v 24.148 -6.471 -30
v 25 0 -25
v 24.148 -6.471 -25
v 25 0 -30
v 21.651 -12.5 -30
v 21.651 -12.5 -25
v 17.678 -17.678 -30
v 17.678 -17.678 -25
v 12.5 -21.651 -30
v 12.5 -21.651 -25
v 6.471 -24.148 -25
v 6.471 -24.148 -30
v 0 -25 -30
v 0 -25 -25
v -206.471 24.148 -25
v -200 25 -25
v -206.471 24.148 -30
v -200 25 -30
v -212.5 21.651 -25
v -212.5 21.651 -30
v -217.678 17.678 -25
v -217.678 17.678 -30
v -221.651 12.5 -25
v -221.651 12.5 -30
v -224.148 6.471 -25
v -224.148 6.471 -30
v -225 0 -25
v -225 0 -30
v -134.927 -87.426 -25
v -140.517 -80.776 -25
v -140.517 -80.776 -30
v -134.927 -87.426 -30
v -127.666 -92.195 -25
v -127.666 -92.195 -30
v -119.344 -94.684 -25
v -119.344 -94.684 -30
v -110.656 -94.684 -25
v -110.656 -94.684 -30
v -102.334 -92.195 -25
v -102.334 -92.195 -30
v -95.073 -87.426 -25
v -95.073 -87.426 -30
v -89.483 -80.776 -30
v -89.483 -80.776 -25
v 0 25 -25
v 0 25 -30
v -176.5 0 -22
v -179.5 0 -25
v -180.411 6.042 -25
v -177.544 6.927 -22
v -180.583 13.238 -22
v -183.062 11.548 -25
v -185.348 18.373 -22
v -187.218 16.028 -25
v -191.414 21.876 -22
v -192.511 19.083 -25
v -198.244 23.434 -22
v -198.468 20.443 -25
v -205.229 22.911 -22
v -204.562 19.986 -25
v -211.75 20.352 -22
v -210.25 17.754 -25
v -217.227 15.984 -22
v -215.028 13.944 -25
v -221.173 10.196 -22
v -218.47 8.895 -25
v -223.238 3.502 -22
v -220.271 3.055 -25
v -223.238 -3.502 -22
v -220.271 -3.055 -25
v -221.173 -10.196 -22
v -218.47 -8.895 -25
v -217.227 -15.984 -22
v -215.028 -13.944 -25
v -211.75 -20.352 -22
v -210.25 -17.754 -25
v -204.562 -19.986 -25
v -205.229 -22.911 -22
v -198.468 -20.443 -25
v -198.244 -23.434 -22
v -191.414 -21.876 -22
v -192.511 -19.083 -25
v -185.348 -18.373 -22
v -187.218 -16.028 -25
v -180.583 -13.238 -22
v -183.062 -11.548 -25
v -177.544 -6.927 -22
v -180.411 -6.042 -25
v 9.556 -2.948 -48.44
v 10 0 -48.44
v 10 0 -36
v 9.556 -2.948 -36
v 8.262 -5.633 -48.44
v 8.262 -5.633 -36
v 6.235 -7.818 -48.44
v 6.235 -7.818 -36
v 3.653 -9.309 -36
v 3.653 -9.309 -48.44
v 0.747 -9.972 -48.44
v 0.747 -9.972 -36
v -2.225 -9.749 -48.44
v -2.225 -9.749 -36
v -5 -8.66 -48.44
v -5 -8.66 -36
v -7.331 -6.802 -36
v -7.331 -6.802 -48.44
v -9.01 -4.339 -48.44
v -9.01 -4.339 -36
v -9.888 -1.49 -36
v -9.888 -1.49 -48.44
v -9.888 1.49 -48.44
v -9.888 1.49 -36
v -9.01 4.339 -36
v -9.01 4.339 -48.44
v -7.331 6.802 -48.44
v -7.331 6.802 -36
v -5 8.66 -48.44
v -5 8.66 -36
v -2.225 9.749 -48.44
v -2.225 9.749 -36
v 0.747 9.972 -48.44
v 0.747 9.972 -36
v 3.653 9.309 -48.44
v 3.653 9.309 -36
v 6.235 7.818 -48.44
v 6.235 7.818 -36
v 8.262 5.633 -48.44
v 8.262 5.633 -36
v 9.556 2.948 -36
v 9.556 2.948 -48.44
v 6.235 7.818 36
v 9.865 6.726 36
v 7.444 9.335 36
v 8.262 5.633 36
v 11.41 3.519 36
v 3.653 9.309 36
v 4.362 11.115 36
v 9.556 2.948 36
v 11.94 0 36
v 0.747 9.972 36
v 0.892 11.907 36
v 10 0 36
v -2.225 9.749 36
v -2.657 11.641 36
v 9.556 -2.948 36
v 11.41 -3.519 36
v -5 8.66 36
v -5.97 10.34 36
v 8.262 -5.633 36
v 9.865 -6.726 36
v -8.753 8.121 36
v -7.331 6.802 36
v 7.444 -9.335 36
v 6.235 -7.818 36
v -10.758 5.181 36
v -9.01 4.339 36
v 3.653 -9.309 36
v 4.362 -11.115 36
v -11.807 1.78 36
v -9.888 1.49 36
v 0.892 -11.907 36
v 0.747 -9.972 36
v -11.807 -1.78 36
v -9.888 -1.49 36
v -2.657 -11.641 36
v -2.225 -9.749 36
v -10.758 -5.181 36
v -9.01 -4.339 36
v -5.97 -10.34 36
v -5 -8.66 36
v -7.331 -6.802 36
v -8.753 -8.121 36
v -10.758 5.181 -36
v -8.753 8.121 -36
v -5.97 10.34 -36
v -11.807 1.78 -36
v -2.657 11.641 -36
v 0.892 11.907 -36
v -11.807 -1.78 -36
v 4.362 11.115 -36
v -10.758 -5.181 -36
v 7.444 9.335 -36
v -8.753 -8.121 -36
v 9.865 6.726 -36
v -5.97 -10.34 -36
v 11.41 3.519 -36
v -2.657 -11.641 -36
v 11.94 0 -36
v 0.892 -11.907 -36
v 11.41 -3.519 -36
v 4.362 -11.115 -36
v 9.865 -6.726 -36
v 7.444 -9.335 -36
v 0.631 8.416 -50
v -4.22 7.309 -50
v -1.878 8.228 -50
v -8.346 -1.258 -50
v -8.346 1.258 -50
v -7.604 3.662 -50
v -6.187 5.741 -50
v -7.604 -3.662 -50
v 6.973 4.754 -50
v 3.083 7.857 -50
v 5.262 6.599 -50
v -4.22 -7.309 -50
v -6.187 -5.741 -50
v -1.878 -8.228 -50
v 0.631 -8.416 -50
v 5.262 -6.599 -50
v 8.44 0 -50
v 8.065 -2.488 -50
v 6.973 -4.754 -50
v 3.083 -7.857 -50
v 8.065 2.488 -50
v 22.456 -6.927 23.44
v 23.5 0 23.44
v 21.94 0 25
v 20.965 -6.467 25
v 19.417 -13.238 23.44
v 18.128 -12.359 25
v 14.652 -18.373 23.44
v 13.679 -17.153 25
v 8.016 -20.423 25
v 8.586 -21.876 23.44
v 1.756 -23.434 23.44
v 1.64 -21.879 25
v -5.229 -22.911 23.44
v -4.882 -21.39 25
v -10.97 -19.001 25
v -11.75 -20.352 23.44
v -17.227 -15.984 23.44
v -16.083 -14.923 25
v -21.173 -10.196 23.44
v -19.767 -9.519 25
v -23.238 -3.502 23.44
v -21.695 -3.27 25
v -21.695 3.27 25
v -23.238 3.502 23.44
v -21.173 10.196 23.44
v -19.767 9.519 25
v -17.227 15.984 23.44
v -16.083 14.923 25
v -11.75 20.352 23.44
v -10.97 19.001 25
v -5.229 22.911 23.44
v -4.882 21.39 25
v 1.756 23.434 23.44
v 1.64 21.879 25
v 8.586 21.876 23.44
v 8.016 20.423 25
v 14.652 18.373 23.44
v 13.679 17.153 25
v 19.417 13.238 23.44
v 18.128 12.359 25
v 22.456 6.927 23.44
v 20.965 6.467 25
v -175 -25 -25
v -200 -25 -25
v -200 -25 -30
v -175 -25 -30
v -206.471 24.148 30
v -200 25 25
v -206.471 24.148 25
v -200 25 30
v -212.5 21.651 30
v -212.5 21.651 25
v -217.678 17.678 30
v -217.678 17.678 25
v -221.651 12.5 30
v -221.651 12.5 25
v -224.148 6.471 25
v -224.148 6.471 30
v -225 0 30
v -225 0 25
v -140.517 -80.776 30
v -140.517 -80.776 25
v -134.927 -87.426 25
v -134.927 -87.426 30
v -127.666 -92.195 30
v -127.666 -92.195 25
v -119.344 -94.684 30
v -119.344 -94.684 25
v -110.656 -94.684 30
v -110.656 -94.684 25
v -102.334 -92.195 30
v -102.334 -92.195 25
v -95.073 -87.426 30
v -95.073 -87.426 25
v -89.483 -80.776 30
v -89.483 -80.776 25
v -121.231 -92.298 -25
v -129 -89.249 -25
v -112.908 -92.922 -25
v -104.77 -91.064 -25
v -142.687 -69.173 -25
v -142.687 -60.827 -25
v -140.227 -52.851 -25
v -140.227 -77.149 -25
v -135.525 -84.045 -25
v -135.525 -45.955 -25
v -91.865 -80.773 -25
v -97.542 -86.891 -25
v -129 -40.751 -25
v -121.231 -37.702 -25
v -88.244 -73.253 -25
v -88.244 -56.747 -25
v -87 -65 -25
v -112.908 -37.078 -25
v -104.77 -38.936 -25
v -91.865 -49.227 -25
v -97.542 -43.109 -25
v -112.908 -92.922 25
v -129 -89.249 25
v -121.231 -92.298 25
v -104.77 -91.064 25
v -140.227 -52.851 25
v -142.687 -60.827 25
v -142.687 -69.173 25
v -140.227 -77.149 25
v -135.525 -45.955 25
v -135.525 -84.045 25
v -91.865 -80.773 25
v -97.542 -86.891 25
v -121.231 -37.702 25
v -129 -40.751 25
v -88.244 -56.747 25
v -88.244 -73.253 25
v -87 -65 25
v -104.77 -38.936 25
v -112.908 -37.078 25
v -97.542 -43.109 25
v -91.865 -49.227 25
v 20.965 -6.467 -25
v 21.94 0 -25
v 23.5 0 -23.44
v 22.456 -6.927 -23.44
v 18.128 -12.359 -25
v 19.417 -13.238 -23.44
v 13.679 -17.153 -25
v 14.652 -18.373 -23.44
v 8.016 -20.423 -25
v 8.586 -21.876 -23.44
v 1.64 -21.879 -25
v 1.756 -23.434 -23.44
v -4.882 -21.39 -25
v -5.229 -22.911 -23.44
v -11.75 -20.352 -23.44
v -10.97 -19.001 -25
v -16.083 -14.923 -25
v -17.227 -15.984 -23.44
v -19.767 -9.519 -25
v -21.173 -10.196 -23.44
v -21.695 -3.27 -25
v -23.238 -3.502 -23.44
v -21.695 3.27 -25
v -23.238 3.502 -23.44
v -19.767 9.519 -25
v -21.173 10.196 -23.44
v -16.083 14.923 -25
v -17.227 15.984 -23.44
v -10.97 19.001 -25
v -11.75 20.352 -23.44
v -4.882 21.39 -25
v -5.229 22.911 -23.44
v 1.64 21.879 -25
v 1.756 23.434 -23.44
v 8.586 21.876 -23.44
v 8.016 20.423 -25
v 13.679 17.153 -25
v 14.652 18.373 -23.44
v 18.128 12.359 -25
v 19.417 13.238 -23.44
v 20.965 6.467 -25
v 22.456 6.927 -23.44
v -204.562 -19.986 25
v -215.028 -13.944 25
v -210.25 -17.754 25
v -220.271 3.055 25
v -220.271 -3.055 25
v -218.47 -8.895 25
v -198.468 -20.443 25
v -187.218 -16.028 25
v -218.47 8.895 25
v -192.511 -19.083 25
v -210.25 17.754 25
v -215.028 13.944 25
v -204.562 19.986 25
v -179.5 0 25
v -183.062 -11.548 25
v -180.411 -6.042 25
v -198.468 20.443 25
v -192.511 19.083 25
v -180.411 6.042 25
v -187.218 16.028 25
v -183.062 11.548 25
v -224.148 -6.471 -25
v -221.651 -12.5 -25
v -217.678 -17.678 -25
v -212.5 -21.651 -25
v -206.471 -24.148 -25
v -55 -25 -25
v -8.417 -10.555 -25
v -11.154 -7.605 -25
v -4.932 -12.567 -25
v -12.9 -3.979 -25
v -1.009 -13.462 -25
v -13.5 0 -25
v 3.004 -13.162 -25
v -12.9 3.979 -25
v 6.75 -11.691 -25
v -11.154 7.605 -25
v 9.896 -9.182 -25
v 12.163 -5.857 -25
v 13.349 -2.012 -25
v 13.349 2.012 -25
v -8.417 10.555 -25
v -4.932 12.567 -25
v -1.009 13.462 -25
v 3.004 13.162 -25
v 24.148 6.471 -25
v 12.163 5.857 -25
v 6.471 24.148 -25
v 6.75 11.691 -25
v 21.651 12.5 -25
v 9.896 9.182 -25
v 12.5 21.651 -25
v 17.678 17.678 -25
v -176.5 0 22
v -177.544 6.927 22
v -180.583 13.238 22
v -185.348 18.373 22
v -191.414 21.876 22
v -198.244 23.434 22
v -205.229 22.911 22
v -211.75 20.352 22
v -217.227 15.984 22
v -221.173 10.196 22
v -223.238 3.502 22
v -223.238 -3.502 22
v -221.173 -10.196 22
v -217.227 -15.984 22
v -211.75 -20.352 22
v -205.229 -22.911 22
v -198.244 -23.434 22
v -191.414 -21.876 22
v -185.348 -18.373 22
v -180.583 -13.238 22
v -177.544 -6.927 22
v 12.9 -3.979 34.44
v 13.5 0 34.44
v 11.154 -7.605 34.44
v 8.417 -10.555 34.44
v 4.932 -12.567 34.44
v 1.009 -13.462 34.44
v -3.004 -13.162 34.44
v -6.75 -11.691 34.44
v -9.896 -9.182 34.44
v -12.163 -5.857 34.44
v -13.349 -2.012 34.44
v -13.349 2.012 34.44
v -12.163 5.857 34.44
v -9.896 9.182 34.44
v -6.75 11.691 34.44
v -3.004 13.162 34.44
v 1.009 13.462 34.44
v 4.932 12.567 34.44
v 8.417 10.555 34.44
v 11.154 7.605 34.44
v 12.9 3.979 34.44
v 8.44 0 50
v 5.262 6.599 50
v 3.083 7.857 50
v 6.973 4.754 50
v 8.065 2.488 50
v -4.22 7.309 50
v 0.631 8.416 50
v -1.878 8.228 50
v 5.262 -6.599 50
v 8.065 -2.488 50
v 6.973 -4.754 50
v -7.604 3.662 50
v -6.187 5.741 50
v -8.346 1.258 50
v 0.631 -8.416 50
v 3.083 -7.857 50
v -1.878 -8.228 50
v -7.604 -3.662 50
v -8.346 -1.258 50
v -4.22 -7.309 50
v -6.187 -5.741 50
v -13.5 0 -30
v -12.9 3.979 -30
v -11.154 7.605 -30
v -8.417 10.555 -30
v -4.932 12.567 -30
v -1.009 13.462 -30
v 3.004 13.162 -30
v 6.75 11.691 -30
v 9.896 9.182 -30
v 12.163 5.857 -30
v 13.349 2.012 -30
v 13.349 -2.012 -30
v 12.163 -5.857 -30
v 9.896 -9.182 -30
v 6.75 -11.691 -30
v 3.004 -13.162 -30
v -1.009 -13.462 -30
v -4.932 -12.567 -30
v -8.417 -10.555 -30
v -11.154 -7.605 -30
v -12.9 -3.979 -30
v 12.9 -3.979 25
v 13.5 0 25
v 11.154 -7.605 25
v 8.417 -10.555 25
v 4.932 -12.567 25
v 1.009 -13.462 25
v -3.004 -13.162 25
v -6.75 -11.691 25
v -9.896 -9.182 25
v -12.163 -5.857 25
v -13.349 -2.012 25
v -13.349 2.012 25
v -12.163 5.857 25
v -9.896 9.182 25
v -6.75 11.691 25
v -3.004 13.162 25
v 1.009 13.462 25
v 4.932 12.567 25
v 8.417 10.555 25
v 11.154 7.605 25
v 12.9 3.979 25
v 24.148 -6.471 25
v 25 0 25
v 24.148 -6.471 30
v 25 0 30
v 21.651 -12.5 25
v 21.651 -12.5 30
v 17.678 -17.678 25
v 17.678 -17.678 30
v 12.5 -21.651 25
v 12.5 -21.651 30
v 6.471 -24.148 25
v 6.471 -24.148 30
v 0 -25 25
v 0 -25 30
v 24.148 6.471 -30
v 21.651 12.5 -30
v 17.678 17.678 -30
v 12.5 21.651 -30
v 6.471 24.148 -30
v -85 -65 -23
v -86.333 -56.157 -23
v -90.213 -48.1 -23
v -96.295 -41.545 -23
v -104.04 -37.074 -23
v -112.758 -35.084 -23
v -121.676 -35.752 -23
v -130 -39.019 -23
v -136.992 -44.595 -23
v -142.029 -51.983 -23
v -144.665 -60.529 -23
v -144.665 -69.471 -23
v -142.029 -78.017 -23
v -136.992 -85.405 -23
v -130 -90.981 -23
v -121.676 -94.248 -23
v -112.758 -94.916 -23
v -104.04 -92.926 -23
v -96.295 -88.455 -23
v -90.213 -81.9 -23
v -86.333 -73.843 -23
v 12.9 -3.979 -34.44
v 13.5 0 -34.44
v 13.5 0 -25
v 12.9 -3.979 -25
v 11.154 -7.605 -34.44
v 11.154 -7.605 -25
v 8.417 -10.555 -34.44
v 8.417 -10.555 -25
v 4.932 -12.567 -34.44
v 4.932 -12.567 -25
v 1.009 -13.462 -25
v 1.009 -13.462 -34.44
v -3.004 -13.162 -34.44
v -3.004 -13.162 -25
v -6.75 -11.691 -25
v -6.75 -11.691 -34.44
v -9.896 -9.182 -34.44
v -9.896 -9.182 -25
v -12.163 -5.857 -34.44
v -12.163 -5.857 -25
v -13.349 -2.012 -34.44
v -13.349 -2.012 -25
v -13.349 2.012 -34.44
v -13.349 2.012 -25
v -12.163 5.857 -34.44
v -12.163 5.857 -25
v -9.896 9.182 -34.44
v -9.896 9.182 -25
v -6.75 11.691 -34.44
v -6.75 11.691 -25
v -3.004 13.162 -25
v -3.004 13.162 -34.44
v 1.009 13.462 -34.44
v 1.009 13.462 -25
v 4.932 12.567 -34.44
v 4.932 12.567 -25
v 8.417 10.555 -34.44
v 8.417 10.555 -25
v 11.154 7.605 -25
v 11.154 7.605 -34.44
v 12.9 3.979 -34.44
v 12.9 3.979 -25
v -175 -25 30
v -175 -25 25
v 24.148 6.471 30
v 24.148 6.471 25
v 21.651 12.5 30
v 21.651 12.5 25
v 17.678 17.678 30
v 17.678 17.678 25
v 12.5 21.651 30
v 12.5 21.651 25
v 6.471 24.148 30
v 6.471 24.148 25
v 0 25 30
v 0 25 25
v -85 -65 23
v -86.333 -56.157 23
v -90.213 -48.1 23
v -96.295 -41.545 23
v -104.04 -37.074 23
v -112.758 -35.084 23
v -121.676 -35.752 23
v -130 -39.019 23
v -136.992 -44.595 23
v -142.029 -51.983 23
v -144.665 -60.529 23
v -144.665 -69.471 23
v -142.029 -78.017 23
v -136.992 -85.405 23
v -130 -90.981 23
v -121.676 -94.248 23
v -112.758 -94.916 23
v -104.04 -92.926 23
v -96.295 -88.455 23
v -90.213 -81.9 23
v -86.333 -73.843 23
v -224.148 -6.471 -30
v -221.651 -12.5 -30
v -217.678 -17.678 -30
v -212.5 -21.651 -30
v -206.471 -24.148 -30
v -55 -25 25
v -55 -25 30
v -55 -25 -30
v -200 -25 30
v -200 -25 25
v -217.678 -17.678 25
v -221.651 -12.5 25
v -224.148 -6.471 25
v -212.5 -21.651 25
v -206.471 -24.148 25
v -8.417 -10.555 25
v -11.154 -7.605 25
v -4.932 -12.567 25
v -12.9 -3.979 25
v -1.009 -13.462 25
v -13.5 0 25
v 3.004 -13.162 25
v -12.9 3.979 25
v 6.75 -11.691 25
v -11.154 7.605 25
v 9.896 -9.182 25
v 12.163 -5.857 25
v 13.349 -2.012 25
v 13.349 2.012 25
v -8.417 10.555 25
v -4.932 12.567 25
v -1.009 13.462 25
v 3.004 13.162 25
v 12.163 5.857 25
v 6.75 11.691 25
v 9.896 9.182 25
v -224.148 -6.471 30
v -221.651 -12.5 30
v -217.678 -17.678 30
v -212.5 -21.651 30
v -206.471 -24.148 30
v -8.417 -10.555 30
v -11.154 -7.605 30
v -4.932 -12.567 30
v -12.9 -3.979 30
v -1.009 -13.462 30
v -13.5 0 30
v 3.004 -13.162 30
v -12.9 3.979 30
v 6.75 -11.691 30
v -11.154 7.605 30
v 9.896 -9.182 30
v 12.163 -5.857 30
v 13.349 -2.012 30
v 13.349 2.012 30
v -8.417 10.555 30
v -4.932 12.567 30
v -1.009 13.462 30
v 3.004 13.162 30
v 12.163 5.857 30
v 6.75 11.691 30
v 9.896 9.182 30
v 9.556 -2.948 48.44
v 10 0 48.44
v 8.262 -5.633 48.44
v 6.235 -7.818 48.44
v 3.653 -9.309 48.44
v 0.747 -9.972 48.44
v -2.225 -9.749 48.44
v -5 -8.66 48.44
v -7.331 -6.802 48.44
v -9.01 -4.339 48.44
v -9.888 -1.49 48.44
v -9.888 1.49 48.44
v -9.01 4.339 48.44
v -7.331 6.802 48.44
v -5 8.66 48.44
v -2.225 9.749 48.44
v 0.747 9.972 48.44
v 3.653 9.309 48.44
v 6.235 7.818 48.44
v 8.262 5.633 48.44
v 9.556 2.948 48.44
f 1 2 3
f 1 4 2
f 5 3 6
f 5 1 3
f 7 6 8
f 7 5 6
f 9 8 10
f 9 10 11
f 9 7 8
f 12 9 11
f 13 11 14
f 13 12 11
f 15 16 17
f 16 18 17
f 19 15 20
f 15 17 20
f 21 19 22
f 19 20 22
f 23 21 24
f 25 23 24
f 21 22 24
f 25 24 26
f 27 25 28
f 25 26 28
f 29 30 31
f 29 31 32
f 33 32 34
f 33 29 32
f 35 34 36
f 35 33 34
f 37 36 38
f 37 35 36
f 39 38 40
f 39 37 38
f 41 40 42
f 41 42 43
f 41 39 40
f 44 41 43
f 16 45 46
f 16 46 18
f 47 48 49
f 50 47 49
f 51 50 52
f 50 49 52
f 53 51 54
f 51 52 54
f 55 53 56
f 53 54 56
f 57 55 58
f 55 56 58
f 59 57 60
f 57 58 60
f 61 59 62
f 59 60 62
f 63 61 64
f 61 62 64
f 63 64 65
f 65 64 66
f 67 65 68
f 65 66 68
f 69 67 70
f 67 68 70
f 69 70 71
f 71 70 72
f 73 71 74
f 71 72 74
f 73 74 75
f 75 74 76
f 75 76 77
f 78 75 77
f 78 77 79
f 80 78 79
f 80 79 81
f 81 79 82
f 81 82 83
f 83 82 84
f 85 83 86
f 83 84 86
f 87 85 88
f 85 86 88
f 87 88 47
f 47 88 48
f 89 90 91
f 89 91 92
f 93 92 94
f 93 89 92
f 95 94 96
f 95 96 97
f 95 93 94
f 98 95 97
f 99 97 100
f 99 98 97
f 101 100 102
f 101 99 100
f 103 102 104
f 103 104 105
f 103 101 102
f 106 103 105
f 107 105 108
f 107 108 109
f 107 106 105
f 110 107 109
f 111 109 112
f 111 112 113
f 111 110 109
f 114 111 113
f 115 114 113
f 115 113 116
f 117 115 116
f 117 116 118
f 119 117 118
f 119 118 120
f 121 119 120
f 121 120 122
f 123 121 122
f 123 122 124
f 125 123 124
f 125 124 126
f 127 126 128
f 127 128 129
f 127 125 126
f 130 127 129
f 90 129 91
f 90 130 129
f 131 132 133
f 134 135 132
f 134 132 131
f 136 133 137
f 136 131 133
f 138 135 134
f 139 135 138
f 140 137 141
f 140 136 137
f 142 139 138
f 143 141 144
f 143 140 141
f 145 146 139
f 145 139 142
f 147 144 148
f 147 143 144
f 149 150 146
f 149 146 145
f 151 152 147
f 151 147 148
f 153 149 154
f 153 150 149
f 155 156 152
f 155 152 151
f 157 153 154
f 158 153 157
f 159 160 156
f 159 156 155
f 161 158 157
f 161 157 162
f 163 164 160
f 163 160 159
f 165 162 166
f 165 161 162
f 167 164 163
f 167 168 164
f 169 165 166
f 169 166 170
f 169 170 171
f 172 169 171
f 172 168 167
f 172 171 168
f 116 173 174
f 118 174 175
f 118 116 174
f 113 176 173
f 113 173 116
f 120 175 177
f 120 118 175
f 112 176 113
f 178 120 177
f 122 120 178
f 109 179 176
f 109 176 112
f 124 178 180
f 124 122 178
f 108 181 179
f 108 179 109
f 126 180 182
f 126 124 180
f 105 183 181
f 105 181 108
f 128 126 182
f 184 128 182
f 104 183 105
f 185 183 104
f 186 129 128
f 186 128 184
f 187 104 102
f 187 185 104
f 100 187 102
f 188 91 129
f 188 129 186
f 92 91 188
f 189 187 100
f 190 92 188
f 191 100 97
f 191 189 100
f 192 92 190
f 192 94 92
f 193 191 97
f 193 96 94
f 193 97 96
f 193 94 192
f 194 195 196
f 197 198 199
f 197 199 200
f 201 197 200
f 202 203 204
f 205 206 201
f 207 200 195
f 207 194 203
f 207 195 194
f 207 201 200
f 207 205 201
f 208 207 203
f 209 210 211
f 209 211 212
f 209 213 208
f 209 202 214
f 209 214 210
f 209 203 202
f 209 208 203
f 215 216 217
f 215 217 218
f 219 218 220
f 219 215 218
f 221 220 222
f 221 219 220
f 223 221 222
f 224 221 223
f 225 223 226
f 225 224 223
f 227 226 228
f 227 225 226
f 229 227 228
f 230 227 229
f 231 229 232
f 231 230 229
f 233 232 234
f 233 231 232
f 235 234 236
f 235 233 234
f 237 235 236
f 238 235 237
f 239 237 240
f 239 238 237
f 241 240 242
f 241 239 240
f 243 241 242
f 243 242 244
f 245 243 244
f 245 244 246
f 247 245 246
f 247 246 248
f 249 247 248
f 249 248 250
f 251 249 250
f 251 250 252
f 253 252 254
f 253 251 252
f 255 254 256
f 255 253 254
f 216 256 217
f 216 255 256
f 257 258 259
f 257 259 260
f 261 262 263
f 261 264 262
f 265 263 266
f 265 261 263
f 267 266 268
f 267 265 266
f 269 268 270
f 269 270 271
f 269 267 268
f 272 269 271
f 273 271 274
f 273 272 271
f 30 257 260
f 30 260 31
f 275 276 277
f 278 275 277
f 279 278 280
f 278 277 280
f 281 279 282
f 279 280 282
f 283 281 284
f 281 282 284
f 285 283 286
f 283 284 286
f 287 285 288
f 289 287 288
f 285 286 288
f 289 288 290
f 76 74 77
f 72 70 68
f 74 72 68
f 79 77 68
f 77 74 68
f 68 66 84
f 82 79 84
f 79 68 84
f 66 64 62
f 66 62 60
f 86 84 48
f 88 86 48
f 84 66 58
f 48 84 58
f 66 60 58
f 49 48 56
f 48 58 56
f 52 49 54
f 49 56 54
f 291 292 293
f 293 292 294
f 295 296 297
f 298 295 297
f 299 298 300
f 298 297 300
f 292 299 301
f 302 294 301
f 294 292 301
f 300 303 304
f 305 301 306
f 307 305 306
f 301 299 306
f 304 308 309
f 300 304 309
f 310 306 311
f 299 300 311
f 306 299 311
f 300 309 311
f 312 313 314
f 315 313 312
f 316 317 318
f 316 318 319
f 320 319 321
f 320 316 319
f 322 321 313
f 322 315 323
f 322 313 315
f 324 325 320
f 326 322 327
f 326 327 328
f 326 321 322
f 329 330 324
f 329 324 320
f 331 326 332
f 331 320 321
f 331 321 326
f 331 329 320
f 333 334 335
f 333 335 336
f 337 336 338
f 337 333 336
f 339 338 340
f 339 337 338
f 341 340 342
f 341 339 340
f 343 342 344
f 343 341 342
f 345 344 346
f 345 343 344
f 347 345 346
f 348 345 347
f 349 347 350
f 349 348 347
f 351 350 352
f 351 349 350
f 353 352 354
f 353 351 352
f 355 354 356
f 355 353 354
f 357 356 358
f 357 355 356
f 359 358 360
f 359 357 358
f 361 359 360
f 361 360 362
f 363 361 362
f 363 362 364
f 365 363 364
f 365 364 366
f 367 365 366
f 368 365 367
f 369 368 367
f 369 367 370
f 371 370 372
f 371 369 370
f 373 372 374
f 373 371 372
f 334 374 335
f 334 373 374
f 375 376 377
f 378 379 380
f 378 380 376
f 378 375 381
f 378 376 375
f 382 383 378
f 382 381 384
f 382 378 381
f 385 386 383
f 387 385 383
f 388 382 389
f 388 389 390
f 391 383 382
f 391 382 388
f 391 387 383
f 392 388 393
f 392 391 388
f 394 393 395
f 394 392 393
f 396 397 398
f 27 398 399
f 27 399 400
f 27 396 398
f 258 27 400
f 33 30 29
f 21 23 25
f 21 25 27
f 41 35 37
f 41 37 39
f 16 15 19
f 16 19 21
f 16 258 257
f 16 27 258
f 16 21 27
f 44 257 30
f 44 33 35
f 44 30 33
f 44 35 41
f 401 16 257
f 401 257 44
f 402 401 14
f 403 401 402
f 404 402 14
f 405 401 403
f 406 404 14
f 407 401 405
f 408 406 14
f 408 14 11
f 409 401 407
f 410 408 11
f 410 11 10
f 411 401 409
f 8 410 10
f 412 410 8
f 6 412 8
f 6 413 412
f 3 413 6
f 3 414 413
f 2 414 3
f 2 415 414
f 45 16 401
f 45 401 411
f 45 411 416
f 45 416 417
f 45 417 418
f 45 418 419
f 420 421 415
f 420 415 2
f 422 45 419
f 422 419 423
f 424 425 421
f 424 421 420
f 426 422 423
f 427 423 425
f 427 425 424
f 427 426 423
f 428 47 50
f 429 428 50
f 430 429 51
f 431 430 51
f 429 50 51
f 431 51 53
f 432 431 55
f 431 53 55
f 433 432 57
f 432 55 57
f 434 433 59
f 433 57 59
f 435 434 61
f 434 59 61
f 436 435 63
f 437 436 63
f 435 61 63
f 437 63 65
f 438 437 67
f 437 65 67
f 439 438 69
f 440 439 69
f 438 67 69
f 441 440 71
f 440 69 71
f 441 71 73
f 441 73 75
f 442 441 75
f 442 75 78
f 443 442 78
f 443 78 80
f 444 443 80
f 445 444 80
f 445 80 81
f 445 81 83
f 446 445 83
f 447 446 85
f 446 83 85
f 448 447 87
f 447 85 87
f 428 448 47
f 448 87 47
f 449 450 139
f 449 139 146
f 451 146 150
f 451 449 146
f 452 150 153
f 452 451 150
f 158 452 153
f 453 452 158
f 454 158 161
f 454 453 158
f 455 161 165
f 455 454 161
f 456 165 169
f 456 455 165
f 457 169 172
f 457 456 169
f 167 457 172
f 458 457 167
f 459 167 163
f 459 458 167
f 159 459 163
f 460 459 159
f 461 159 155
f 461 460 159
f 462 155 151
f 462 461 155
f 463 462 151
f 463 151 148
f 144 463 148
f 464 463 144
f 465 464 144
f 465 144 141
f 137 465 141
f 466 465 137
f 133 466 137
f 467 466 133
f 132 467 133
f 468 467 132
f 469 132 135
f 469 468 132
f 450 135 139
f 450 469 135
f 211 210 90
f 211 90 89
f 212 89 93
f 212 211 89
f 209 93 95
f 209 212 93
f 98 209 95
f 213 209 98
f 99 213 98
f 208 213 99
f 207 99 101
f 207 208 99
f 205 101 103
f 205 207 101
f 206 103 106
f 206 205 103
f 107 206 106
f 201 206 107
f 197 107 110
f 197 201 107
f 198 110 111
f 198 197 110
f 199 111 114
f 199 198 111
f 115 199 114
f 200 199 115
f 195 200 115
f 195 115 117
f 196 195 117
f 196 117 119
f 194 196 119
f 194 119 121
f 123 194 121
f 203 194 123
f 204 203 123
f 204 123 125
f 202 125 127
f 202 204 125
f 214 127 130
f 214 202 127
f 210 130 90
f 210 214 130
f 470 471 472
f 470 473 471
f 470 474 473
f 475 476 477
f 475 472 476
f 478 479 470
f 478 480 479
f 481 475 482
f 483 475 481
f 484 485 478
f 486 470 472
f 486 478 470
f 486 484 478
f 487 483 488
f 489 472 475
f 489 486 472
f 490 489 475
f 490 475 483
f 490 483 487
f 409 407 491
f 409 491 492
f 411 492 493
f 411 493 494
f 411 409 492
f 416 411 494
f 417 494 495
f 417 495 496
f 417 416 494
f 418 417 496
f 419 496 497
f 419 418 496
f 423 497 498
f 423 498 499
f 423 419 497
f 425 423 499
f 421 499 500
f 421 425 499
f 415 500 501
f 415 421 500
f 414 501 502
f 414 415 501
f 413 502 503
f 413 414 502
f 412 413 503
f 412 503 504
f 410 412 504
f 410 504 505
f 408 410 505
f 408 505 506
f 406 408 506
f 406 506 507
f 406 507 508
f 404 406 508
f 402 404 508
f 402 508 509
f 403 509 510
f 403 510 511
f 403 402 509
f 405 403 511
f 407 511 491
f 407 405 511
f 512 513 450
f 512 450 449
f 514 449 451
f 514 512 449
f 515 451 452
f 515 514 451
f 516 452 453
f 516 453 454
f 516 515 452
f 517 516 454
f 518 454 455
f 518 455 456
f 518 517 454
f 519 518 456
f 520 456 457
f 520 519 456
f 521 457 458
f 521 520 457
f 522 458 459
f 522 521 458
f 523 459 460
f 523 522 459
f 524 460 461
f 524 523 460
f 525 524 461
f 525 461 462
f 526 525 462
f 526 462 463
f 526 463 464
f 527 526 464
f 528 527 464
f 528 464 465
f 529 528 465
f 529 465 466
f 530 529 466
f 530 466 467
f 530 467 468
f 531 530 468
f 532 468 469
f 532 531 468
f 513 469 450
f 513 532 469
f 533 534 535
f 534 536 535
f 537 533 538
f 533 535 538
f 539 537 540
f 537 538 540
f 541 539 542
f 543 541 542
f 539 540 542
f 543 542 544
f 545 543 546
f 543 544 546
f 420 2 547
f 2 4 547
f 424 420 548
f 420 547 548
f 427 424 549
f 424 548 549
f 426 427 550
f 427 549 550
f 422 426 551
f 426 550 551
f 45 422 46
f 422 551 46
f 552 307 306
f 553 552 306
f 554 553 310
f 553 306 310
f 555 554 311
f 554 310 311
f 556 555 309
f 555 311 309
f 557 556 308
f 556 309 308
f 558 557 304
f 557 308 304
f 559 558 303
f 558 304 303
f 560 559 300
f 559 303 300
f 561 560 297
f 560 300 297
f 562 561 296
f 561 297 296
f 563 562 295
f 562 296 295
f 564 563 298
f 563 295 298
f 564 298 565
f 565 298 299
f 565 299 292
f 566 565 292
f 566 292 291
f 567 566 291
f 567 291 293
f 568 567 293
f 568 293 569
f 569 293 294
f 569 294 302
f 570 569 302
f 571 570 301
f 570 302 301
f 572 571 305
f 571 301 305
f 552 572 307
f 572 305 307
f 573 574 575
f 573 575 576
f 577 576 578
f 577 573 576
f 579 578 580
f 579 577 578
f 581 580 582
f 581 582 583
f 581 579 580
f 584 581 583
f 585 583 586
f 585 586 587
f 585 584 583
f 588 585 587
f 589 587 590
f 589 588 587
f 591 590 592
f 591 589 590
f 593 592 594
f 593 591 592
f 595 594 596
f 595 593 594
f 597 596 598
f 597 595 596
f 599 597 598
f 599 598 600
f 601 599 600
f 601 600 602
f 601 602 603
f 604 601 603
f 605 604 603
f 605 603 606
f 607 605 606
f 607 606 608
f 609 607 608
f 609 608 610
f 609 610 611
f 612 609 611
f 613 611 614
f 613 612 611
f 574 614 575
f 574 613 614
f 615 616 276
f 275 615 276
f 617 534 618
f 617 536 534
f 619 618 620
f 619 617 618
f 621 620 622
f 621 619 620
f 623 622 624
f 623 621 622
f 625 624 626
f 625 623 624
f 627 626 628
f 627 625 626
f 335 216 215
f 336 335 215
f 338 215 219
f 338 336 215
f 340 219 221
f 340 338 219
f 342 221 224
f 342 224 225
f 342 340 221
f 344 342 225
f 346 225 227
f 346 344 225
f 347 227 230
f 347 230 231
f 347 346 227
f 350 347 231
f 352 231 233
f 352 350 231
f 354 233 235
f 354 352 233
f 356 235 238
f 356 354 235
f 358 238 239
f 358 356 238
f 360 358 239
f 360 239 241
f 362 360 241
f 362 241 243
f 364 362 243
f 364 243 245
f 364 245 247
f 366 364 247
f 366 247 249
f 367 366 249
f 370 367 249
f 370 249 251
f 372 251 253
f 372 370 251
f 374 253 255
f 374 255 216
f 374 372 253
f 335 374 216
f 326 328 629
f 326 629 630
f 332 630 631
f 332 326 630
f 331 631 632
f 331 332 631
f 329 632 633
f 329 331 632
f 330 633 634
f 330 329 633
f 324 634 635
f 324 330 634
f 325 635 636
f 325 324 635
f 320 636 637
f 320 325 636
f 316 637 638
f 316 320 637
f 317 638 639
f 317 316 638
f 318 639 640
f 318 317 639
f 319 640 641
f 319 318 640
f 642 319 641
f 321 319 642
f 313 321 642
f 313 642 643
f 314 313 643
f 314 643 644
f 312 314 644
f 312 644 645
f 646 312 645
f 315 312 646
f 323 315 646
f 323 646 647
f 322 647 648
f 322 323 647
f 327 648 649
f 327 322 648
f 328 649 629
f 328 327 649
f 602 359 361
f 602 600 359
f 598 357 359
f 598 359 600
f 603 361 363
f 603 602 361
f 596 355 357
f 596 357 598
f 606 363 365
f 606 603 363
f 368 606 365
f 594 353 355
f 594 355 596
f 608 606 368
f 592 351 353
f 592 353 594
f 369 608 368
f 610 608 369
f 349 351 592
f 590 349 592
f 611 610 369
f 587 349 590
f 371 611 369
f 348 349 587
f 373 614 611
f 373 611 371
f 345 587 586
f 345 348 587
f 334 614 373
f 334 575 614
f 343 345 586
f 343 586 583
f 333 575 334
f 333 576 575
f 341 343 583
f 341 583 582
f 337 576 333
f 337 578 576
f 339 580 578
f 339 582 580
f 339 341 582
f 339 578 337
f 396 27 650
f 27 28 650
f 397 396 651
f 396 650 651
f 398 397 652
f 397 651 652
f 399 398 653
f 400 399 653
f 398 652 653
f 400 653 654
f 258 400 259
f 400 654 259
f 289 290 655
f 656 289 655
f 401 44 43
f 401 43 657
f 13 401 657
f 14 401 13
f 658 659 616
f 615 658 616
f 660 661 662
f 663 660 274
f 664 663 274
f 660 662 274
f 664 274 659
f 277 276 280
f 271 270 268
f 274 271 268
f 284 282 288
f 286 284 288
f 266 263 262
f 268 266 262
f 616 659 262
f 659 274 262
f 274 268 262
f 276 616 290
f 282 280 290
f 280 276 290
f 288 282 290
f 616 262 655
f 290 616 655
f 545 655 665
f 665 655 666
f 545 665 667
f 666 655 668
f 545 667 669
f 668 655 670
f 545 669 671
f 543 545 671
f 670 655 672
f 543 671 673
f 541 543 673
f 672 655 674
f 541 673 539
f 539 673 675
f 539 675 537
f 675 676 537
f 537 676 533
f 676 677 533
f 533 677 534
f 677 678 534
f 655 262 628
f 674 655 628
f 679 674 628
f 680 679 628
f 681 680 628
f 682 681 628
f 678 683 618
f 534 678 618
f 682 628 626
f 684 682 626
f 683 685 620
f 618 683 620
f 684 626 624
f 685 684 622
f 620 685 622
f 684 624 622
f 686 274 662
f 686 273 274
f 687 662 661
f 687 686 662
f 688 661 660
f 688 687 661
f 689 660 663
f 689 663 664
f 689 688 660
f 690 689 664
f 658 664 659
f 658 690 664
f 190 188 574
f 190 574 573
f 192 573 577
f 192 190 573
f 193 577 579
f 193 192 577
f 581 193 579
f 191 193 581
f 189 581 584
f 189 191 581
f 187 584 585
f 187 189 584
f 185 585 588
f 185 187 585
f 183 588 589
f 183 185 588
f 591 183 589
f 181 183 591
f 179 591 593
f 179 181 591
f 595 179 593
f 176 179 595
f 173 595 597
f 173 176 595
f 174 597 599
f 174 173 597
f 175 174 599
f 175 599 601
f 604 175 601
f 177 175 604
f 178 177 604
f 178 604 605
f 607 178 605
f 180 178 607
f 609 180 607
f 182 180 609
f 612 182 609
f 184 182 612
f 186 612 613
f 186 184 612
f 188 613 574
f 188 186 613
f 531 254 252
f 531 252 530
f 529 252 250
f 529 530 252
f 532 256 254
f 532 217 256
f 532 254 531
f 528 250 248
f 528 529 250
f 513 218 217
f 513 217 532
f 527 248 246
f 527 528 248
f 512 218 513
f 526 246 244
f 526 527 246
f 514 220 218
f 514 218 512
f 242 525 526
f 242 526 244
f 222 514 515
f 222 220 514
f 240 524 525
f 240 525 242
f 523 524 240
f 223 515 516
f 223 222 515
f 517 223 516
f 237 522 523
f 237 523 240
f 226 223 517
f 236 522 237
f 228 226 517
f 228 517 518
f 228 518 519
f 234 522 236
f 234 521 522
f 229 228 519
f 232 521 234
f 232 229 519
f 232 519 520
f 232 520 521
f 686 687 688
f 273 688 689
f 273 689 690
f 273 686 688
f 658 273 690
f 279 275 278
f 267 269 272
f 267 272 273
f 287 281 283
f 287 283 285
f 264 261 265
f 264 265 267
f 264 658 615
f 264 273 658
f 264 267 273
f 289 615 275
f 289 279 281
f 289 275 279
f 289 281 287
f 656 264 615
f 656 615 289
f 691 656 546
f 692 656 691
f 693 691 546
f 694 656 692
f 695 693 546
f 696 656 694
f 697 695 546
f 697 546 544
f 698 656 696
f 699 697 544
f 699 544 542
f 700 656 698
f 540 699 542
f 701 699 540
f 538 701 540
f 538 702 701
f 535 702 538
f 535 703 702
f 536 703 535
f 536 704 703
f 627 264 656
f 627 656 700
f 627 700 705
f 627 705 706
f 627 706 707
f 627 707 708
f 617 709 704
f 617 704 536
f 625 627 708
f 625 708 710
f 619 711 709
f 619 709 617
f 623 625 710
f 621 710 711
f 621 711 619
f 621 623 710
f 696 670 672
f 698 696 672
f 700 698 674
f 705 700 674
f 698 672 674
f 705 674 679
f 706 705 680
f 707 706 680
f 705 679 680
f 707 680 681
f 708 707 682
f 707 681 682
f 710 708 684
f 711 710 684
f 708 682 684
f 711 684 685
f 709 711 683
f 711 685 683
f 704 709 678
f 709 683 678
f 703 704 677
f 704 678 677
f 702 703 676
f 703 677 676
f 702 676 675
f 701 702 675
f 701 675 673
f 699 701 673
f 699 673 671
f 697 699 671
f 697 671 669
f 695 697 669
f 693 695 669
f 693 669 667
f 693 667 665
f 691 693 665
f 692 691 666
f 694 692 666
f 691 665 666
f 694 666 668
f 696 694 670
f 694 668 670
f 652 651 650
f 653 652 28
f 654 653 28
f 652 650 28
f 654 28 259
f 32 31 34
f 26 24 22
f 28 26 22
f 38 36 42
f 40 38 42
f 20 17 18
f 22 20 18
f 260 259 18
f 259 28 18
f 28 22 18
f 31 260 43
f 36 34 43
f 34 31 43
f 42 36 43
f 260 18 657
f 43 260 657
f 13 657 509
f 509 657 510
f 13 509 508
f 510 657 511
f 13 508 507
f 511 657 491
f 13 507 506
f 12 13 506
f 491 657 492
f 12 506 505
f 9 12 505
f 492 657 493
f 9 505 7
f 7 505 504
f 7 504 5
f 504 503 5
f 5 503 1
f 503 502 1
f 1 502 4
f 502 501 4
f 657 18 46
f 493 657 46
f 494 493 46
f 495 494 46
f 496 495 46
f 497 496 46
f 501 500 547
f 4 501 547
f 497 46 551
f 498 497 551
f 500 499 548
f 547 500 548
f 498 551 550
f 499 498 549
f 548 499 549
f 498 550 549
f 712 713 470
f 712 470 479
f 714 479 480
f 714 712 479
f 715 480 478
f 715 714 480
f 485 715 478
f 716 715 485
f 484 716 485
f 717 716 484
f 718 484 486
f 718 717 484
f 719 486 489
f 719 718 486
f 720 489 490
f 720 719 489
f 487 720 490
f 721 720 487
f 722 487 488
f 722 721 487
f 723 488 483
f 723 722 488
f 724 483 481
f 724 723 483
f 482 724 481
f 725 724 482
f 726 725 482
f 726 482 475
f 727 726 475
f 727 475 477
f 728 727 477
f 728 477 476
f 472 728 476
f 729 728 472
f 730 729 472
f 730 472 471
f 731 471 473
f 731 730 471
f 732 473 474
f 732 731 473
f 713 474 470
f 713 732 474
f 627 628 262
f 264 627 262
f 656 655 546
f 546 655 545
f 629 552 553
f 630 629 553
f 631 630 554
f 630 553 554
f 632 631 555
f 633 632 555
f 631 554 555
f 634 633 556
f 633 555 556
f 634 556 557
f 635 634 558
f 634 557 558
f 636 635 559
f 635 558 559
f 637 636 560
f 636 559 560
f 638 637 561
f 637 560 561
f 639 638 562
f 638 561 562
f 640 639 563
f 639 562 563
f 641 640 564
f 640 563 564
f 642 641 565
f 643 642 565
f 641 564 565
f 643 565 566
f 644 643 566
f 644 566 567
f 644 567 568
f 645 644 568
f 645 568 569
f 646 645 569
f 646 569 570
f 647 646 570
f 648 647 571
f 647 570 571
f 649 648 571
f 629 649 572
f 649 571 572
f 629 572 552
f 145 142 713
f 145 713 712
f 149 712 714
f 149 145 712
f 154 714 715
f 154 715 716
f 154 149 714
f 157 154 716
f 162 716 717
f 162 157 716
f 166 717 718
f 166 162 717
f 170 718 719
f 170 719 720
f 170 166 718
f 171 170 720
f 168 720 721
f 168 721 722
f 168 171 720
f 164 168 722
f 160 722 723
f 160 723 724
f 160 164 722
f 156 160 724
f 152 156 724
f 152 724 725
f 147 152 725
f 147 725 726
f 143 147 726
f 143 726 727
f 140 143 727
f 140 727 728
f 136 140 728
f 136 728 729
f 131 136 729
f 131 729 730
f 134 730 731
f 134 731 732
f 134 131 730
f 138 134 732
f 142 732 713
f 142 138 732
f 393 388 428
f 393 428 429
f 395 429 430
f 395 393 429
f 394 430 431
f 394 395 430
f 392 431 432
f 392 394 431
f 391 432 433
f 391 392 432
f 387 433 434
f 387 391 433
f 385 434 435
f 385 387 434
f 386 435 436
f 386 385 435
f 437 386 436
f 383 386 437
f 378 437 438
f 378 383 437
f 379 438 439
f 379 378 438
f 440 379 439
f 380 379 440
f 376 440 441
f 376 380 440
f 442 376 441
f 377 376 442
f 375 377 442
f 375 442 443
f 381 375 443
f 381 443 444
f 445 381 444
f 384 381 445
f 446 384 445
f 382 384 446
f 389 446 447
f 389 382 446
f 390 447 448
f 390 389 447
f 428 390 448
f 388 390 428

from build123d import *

# Parameters (mm, degrees)
CHAMFER_1_SIZE  = 1.56
SKETCH_2_R      = 13.5
EXTRUDE_1_DEPTH = 5
FILLET_1_R      = 25
SKETCH_3_R      = 30
EXTRUDE_2_DEPTH = 50
SKETCH_4_R      = 23.5
EXTRUDE_3_DEPTH = 50
CHAMFER_2_SIZE  = 3
CHAMFER_3_SIZE  = 2


with BuildPart() as part:
    # Эскиз1 → Повернуть1 (revolve)
    with BuildSketch(Plane(origin=(0, 0, 0), x_dir=(0, 0, -1), z_dir=(1, 0, 0)), mode=Mode.PRIVATE) as revolve_1_sk:
        Polygon((-50, 0), (-50, 10), (-36, 10), (-36, 13.5), (-25, 13.5), (-25, 23.5), (25, 23.5), (25, 13.5), (36, 13.5), (36, 10), (50, 10), (50, 0), align=None)
    revolve(revolve_1_sk.sketch.rotate(Axis((0, 0, 71.126446899), (0, 0, -1)), 90), axis=Axis((0, 0, 71.126446899), (0, 0, -1)))

    # Фаска1
    chamfer_1_edges = [part.edges().sort_by_distance(p)[0] for p in [
        (-13.5, 0, -36),
        (-23.5, 0, -25),
        (-23.5, 0, 25),
        (-13.5, 0, 36),
        (-10, 0, 50),
        (-10, 0, -50),
    ]]
    chamfer(chamfer_1_edges, length=CHAMFER_1_SIZE)


with BuildPart() as body_2:
    # Эскиз2 → Бобышка-Вытянуть1 (new body)
    with BuildSketch(Plane(origin=(0, 0, -25), x_dir=(-1, 0, 0), z_dir=(0, 0, -1))):
        with BuildLine():
            Line((-25, -25), (-25, 25))
            Line((-25, 25), (225, 25))
            Line((225, 25), (225, -25))
            Line((225, -25), (175, -25))
            Line((175, -25), (140.517165825, -80.775748738))
            ThreePointArc((140.517165825, -80.775748738), (115, -95), (89.482834175, -80.775748738))
            Line((89.482834175, -80.775748738), (55, -25))
            Line((55, -25), (-25, -25))
        make_face()
        Circle(SKETCH_2_R, mode=Mode.SUBTRACT)
    extrude(amount=EXTRUDE_1_DEPTH)

    # Скругление1
    fillet_1_edges = [body_2.edges().sort_by_distance(p)[0] for p in [
        (25, -25, -27.5),
        (25, 25, -27.5),
        (-225, -25, -27.5),
        (-225, 25, -27.5),
    ]]
    fillet(fillet_1_edges, radius=FILLET_1_R - 0.0001)  # a hair under: the kernel refuses the full size


with BuildPart() as body_3:
    # Зеркальное отражение1: mirrored copy
    add(body_2.part.mirror(Plane.XY))


with BuildPart() as body_4:
    # Эскиз3 → Бобышка-Вытянуть2 (new body)
    with BuildSketch(Plane.XY.offset(-25)):
        with Locations((-115, -65)):
            Circle(SKETCH_3_R)
    extrude(amount=EXTRUDE_2_DEPTH)

    # Фаска3
    chamfer_3_edges = [body_4.edges().sort_by_distance(p)[0] for p in [
        (-145, -65, 25),
        (-145, -65, -25),
    ]]
    chamfer(chamfer_3_edges, length=CHAMFER_3_SIZE)


with BuildPart() as body_5:
    # Эскиз4 → Бобышка-Вытянуть3 (new body)
    with BuildSketch(Plane.XY.offset(-25)):
        with Locations((-200, 0)):
            Circle(SKETCH_4_R)
    extrude(amount=EXTRUDE_3_DEPTH)

    # Фаска2
    chamfer_2_edges = [body_5.edges().sort_by_distance(p)[0] for p in [
        (-223.5, 0, -25),
        (-223.5, 0, 25),
    ]]
    chamfer(chamfer_2_edges, length=CHAMFER_2_SIZE)


solid = Compound([part.part, body_2.part, body_3.part, body_4.part, body_5.part])
